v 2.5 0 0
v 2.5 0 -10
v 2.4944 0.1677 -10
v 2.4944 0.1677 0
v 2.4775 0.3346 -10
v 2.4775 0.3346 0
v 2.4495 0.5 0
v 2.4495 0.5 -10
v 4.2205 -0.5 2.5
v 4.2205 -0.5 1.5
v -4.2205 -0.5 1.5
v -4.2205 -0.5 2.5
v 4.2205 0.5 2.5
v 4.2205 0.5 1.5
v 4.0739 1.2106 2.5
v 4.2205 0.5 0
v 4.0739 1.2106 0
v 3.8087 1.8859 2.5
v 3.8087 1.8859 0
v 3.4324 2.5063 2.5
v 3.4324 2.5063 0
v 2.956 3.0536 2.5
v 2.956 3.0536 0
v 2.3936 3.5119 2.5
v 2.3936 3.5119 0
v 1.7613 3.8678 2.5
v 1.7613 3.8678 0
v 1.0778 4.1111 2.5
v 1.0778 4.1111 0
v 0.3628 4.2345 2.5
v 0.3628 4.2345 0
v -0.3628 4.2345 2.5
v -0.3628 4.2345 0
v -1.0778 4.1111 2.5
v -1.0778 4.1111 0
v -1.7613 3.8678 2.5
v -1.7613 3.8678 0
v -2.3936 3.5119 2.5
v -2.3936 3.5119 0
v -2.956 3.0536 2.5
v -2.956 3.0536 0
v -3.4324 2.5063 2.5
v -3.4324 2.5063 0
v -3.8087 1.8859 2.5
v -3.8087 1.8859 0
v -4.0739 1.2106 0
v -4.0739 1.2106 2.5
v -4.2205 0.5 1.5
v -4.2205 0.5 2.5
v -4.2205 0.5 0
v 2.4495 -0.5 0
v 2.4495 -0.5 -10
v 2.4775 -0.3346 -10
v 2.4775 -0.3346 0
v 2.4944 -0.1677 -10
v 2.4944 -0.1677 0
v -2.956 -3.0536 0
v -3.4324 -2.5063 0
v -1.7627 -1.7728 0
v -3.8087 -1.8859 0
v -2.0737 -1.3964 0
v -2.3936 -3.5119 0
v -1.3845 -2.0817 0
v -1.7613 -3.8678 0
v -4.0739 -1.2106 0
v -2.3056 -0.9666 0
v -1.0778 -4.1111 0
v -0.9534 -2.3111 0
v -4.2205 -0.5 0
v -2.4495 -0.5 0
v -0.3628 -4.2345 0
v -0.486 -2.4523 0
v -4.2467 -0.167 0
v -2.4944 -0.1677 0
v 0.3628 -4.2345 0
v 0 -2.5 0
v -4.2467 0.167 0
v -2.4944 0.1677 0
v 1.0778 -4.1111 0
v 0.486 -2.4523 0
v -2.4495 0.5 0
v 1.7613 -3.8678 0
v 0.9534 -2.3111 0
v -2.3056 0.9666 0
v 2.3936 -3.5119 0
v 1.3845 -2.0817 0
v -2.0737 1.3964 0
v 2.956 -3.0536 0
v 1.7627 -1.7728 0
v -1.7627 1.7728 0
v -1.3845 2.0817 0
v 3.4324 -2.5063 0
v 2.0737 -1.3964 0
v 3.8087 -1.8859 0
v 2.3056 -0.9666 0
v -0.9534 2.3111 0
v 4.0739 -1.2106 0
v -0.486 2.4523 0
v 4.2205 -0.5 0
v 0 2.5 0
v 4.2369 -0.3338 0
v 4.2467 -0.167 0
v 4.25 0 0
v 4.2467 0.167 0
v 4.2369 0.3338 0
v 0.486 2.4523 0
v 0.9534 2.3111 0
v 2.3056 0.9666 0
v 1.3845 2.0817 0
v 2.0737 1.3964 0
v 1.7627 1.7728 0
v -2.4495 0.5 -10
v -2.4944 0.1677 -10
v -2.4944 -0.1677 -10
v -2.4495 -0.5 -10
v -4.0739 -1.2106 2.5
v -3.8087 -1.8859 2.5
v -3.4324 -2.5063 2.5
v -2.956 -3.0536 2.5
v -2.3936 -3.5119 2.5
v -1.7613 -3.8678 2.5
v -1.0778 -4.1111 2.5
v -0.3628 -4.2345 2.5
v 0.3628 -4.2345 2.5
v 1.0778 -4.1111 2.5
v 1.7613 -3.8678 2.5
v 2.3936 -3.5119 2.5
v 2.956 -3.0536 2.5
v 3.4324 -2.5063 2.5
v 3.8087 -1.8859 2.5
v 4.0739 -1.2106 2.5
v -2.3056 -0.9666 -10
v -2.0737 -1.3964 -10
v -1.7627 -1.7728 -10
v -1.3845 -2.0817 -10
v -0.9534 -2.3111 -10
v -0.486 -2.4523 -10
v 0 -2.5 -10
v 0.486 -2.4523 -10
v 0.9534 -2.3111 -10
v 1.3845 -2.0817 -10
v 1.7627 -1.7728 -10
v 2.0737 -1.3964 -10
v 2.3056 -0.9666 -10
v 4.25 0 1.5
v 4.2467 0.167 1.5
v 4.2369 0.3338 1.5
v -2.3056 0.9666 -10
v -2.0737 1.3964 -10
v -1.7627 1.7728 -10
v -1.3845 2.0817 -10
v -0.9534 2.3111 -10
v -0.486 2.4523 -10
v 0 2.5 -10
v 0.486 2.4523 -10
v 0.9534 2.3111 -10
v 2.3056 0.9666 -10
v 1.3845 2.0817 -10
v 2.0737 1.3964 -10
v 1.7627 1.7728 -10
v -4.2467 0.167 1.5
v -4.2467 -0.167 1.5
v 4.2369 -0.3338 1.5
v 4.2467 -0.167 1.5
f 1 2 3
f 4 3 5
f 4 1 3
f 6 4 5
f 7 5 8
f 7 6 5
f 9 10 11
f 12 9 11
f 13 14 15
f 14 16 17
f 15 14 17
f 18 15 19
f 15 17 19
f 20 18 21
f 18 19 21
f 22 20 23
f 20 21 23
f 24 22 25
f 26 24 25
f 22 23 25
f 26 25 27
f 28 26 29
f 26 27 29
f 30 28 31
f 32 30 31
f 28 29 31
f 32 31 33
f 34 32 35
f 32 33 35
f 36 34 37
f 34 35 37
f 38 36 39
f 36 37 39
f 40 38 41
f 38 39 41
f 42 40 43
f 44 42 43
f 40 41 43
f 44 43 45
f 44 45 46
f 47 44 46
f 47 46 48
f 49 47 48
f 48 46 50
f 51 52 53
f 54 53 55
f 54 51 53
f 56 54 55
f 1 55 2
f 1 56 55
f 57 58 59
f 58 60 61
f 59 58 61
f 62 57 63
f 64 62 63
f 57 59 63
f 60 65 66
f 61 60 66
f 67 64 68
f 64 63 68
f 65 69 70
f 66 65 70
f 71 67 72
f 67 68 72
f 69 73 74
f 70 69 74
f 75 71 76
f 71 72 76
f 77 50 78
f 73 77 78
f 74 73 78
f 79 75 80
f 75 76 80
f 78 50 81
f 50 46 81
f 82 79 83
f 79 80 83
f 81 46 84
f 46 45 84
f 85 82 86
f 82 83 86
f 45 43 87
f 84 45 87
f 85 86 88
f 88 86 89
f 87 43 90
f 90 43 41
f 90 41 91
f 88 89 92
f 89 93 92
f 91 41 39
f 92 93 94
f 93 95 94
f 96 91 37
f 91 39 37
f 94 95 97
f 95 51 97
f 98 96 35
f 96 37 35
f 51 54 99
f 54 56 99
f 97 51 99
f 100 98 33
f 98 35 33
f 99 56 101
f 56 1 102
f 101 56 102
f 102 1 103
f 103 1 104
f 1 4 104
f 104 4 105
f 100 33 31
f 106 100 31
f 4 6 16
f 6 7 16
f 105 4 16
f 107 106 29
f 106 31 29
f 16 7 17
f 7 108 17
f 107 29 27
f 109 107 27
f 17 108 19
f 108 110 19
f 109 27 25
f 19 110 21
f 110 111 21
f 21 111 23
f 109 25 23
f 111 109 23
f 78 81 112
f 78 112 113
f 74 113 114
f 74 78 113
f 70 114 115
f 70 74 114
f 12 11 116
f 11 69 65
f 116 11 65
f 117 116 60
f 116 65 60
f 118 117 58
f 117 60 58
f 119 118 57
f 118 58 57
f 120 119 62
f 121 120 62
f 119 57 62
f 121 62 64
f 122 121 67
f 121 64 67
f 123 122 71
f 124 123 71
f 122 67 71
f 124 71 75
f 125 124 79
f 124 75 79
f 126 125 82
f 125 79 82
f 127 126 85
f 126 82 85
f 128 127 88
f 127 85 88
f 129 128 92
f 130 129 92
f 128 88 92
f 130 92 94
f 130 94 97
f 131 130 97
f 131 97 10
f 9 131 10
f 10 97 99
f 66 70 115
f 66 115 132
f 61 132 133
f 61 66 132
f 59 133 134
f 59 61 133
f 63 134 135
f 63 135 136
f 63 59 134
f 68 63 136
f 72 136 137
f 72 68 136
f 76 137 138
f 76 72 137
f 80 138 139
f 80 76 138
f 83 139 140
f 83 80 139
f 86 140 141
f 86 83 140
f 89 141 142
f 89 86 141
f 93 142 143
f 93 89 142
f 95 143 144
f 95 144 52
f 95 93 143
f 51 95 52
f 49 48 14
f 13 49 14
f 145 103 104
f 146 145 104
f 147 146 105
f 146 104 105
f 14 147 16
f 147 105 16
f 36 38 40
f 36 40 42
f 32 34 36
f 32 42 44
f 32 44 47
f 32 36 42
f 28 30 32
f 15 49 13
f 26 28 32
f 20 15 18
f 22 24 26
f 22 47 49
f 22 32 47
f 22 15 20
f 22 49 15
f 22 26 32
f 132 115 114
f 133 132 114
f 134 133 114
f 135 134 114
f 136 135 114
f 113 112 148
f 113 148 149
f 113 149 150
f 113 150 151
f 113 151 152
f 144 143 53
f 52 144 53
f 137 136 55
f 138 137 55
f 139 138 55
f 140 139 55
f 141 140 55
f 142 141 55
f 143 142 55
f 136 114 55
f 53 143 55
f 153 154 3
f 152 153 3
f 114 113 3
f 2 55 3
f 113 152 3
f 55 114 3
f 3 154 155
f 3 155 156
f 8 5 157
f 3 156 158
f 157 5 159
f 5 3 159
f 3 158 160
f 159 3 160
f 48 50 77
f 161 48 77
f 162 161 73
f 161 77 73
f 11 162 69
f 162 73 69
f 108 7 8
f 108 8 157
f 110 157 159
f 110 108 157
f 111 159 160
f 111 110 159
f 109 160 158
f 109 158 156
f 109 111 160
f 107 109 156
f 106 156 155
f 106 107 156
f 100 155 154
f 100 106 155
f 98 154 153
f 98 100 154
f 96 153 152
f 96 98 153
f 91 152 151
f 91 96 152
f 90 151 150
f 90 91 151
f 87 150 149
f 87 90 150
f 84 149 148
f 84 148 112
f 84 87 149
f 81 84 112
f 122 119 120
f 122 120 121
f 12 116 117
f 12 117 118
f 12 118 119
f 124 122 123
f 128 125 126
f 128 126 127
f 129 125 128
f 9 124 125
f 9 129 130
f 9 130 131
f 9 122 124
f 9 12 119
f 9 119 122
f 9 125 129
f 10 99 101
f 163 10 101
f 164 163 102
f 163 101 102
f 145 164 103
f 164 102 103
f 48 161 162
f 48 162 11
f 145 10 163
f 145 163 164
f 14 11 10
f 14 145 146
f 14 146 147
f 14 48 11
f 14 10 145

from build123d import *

# Parameters (mm, degrees)
F1_DEPTH = 10
F2_DEPTH = 2.5
F3_DEPTH = 1.5


# Not quite as in the source:
# - a feature names something its author has since deleted; it is built from what else it names


with BuildPart() as f1:
    # F0 (on Top) → F1 (new body)
    with BuildSketch(Plane.XY):
        with BuildLine():
            Line((-2.4494897428, 0.5), (2.4494897428, 0.5))
            ThreePointArc((2.4494897428, 0.5), (0, 2.5), (-2.4494897428, 0.5))
        make_face()
        with BuildLine():
            ThreePointArc((2.5, 0), (2.4873403825, 0.251272405), (2.4494897428, 0.5))
            Line((2.4494897428, 0.5), (-2.4494897428, 0.5))
            ThreePointArc((-2.4494897428, 0.5), (-2.5, 0), (-2.4494897428, -0.5))
            Line((-2.4494897428, -0.5), (2.4494897428, -0.5))
            ThreePointArc((2.4494897428, -0.5), (2.4873403825, -0.251272405), (2.5, 0))
        make_face()
        with BuildLine():
            ThreePointArc((-2.4494897428, -0.5), (0, -2.5), (2.4494897428, -0.5))
            Line((2.4494897428, -0.5), (-2.4494897428, -0.5))
        make_face()
    extrude(amount=-F1_DEPTH)

    # F0 (on Top) → F2 (join)
    with BuildSketch(Plane.XY):
        with BuildLine():
            ThreePointArc((-4.220485754, -0.5), (0, -4.25), (4.220485754, -0.5))
            Line((4.220485754, -0.5), (2.4494897428, -0.5))
            ThreePointArc((2.4494897428, -0.5), (0, -2.5), (-2.4494897428, -0.5))
            Line((-2.4494897428, -0.5), (-4.220485754, -0.5))
        make_face()
        with BuildLine():
            Line((2.4494897428, 0.5), (4.220485754, 0.5))
            ThreePointArc((4.220485754, 0.5), (0, 4.25), (-4.220485754, 0.5))
            Line((-4.220485754, 0.5), (-2.4494897428, 0.5))
            ThreePointArc((-2.4494897428, 0.5), (0, 2.5), (2.4494897428, 0.5))
        make_face()
        with BuildLine():
            Line((-2.4494897428, 0.5), (2.4494897428, 0.5))
            ThreePointArc((2.4494897428, 0.5), (0, 2.5), (-2.4494897428, 0.5))
        make_face()
        with BuildLine():
            ThreePointArc((-2.4494897428, -0.5), (0, -2.5), (2.4494897428, -0.5))
            Line((2.4494897428, -0.5), (-2.4494897428, -0.5))
        make_face()
    extrude(amount=F2_DEPTH)

    # F0 (on Top) → F3 (join)
    with BuildSketch(Plane.XY):
        with BuildLine():
            Line((-2.4494897428, 0.5), (-4.220485754, 0.5))
            ThreePointArc((-4.220485754, 0.5), (-4.25, 0), (-4.220485754, -0.5))
            Line((-4.220485754, -0.5), (-2.4494897428, -0.5))
            ThreePointArc((-2.4494897428, -0.5), (-2.5, 0), (-2.4494897428, 0.5))
        make_face()
        with BuildLine():
            ThreePointArc((2.5, 0), (2.4873403825, 0.251272405), (2.4494897428, 0.5))
            Line((2.4494897428, 0.5), (-2.4494897428, 0.5))
            ThreePointArc((-2.4494897428, 0.5), (-2.5, 0), (-2.4494897428, -0.5))
            Line((-2.4494897428, -0.5), (2.4494897428, -0.5))
            ThreePointArc((2.4494897428, -0.5), (2.4873403825, -0.251272405), (2.5, 0))
        make_face()
        with BuildLine():
            ThreePointArc((4.220485754, -0.5), (4.2426150223, -0.2504351666), (4.25, 0))
            ThreePointArc((4.25, 0), (4.2426150223, 0.2504351666), (4.220485754, 0.5))
            Line((4.220485754, 0.5), (2.4494897428, 0.5))
            ThreePointArc((2.4494897428, 0.5), (2.4873403825, 0.251272405), (2.5, 0))
            ThreePointArc((2.5, 0), (2.4873403825, -0.251272405), (2.4494897428, -0.5))
            Line((2.4494897428, -0.5), (4.220485754, -0.5))
        make_face()
    extrude(amount=F3_DEPTH)


solid = f1.part
